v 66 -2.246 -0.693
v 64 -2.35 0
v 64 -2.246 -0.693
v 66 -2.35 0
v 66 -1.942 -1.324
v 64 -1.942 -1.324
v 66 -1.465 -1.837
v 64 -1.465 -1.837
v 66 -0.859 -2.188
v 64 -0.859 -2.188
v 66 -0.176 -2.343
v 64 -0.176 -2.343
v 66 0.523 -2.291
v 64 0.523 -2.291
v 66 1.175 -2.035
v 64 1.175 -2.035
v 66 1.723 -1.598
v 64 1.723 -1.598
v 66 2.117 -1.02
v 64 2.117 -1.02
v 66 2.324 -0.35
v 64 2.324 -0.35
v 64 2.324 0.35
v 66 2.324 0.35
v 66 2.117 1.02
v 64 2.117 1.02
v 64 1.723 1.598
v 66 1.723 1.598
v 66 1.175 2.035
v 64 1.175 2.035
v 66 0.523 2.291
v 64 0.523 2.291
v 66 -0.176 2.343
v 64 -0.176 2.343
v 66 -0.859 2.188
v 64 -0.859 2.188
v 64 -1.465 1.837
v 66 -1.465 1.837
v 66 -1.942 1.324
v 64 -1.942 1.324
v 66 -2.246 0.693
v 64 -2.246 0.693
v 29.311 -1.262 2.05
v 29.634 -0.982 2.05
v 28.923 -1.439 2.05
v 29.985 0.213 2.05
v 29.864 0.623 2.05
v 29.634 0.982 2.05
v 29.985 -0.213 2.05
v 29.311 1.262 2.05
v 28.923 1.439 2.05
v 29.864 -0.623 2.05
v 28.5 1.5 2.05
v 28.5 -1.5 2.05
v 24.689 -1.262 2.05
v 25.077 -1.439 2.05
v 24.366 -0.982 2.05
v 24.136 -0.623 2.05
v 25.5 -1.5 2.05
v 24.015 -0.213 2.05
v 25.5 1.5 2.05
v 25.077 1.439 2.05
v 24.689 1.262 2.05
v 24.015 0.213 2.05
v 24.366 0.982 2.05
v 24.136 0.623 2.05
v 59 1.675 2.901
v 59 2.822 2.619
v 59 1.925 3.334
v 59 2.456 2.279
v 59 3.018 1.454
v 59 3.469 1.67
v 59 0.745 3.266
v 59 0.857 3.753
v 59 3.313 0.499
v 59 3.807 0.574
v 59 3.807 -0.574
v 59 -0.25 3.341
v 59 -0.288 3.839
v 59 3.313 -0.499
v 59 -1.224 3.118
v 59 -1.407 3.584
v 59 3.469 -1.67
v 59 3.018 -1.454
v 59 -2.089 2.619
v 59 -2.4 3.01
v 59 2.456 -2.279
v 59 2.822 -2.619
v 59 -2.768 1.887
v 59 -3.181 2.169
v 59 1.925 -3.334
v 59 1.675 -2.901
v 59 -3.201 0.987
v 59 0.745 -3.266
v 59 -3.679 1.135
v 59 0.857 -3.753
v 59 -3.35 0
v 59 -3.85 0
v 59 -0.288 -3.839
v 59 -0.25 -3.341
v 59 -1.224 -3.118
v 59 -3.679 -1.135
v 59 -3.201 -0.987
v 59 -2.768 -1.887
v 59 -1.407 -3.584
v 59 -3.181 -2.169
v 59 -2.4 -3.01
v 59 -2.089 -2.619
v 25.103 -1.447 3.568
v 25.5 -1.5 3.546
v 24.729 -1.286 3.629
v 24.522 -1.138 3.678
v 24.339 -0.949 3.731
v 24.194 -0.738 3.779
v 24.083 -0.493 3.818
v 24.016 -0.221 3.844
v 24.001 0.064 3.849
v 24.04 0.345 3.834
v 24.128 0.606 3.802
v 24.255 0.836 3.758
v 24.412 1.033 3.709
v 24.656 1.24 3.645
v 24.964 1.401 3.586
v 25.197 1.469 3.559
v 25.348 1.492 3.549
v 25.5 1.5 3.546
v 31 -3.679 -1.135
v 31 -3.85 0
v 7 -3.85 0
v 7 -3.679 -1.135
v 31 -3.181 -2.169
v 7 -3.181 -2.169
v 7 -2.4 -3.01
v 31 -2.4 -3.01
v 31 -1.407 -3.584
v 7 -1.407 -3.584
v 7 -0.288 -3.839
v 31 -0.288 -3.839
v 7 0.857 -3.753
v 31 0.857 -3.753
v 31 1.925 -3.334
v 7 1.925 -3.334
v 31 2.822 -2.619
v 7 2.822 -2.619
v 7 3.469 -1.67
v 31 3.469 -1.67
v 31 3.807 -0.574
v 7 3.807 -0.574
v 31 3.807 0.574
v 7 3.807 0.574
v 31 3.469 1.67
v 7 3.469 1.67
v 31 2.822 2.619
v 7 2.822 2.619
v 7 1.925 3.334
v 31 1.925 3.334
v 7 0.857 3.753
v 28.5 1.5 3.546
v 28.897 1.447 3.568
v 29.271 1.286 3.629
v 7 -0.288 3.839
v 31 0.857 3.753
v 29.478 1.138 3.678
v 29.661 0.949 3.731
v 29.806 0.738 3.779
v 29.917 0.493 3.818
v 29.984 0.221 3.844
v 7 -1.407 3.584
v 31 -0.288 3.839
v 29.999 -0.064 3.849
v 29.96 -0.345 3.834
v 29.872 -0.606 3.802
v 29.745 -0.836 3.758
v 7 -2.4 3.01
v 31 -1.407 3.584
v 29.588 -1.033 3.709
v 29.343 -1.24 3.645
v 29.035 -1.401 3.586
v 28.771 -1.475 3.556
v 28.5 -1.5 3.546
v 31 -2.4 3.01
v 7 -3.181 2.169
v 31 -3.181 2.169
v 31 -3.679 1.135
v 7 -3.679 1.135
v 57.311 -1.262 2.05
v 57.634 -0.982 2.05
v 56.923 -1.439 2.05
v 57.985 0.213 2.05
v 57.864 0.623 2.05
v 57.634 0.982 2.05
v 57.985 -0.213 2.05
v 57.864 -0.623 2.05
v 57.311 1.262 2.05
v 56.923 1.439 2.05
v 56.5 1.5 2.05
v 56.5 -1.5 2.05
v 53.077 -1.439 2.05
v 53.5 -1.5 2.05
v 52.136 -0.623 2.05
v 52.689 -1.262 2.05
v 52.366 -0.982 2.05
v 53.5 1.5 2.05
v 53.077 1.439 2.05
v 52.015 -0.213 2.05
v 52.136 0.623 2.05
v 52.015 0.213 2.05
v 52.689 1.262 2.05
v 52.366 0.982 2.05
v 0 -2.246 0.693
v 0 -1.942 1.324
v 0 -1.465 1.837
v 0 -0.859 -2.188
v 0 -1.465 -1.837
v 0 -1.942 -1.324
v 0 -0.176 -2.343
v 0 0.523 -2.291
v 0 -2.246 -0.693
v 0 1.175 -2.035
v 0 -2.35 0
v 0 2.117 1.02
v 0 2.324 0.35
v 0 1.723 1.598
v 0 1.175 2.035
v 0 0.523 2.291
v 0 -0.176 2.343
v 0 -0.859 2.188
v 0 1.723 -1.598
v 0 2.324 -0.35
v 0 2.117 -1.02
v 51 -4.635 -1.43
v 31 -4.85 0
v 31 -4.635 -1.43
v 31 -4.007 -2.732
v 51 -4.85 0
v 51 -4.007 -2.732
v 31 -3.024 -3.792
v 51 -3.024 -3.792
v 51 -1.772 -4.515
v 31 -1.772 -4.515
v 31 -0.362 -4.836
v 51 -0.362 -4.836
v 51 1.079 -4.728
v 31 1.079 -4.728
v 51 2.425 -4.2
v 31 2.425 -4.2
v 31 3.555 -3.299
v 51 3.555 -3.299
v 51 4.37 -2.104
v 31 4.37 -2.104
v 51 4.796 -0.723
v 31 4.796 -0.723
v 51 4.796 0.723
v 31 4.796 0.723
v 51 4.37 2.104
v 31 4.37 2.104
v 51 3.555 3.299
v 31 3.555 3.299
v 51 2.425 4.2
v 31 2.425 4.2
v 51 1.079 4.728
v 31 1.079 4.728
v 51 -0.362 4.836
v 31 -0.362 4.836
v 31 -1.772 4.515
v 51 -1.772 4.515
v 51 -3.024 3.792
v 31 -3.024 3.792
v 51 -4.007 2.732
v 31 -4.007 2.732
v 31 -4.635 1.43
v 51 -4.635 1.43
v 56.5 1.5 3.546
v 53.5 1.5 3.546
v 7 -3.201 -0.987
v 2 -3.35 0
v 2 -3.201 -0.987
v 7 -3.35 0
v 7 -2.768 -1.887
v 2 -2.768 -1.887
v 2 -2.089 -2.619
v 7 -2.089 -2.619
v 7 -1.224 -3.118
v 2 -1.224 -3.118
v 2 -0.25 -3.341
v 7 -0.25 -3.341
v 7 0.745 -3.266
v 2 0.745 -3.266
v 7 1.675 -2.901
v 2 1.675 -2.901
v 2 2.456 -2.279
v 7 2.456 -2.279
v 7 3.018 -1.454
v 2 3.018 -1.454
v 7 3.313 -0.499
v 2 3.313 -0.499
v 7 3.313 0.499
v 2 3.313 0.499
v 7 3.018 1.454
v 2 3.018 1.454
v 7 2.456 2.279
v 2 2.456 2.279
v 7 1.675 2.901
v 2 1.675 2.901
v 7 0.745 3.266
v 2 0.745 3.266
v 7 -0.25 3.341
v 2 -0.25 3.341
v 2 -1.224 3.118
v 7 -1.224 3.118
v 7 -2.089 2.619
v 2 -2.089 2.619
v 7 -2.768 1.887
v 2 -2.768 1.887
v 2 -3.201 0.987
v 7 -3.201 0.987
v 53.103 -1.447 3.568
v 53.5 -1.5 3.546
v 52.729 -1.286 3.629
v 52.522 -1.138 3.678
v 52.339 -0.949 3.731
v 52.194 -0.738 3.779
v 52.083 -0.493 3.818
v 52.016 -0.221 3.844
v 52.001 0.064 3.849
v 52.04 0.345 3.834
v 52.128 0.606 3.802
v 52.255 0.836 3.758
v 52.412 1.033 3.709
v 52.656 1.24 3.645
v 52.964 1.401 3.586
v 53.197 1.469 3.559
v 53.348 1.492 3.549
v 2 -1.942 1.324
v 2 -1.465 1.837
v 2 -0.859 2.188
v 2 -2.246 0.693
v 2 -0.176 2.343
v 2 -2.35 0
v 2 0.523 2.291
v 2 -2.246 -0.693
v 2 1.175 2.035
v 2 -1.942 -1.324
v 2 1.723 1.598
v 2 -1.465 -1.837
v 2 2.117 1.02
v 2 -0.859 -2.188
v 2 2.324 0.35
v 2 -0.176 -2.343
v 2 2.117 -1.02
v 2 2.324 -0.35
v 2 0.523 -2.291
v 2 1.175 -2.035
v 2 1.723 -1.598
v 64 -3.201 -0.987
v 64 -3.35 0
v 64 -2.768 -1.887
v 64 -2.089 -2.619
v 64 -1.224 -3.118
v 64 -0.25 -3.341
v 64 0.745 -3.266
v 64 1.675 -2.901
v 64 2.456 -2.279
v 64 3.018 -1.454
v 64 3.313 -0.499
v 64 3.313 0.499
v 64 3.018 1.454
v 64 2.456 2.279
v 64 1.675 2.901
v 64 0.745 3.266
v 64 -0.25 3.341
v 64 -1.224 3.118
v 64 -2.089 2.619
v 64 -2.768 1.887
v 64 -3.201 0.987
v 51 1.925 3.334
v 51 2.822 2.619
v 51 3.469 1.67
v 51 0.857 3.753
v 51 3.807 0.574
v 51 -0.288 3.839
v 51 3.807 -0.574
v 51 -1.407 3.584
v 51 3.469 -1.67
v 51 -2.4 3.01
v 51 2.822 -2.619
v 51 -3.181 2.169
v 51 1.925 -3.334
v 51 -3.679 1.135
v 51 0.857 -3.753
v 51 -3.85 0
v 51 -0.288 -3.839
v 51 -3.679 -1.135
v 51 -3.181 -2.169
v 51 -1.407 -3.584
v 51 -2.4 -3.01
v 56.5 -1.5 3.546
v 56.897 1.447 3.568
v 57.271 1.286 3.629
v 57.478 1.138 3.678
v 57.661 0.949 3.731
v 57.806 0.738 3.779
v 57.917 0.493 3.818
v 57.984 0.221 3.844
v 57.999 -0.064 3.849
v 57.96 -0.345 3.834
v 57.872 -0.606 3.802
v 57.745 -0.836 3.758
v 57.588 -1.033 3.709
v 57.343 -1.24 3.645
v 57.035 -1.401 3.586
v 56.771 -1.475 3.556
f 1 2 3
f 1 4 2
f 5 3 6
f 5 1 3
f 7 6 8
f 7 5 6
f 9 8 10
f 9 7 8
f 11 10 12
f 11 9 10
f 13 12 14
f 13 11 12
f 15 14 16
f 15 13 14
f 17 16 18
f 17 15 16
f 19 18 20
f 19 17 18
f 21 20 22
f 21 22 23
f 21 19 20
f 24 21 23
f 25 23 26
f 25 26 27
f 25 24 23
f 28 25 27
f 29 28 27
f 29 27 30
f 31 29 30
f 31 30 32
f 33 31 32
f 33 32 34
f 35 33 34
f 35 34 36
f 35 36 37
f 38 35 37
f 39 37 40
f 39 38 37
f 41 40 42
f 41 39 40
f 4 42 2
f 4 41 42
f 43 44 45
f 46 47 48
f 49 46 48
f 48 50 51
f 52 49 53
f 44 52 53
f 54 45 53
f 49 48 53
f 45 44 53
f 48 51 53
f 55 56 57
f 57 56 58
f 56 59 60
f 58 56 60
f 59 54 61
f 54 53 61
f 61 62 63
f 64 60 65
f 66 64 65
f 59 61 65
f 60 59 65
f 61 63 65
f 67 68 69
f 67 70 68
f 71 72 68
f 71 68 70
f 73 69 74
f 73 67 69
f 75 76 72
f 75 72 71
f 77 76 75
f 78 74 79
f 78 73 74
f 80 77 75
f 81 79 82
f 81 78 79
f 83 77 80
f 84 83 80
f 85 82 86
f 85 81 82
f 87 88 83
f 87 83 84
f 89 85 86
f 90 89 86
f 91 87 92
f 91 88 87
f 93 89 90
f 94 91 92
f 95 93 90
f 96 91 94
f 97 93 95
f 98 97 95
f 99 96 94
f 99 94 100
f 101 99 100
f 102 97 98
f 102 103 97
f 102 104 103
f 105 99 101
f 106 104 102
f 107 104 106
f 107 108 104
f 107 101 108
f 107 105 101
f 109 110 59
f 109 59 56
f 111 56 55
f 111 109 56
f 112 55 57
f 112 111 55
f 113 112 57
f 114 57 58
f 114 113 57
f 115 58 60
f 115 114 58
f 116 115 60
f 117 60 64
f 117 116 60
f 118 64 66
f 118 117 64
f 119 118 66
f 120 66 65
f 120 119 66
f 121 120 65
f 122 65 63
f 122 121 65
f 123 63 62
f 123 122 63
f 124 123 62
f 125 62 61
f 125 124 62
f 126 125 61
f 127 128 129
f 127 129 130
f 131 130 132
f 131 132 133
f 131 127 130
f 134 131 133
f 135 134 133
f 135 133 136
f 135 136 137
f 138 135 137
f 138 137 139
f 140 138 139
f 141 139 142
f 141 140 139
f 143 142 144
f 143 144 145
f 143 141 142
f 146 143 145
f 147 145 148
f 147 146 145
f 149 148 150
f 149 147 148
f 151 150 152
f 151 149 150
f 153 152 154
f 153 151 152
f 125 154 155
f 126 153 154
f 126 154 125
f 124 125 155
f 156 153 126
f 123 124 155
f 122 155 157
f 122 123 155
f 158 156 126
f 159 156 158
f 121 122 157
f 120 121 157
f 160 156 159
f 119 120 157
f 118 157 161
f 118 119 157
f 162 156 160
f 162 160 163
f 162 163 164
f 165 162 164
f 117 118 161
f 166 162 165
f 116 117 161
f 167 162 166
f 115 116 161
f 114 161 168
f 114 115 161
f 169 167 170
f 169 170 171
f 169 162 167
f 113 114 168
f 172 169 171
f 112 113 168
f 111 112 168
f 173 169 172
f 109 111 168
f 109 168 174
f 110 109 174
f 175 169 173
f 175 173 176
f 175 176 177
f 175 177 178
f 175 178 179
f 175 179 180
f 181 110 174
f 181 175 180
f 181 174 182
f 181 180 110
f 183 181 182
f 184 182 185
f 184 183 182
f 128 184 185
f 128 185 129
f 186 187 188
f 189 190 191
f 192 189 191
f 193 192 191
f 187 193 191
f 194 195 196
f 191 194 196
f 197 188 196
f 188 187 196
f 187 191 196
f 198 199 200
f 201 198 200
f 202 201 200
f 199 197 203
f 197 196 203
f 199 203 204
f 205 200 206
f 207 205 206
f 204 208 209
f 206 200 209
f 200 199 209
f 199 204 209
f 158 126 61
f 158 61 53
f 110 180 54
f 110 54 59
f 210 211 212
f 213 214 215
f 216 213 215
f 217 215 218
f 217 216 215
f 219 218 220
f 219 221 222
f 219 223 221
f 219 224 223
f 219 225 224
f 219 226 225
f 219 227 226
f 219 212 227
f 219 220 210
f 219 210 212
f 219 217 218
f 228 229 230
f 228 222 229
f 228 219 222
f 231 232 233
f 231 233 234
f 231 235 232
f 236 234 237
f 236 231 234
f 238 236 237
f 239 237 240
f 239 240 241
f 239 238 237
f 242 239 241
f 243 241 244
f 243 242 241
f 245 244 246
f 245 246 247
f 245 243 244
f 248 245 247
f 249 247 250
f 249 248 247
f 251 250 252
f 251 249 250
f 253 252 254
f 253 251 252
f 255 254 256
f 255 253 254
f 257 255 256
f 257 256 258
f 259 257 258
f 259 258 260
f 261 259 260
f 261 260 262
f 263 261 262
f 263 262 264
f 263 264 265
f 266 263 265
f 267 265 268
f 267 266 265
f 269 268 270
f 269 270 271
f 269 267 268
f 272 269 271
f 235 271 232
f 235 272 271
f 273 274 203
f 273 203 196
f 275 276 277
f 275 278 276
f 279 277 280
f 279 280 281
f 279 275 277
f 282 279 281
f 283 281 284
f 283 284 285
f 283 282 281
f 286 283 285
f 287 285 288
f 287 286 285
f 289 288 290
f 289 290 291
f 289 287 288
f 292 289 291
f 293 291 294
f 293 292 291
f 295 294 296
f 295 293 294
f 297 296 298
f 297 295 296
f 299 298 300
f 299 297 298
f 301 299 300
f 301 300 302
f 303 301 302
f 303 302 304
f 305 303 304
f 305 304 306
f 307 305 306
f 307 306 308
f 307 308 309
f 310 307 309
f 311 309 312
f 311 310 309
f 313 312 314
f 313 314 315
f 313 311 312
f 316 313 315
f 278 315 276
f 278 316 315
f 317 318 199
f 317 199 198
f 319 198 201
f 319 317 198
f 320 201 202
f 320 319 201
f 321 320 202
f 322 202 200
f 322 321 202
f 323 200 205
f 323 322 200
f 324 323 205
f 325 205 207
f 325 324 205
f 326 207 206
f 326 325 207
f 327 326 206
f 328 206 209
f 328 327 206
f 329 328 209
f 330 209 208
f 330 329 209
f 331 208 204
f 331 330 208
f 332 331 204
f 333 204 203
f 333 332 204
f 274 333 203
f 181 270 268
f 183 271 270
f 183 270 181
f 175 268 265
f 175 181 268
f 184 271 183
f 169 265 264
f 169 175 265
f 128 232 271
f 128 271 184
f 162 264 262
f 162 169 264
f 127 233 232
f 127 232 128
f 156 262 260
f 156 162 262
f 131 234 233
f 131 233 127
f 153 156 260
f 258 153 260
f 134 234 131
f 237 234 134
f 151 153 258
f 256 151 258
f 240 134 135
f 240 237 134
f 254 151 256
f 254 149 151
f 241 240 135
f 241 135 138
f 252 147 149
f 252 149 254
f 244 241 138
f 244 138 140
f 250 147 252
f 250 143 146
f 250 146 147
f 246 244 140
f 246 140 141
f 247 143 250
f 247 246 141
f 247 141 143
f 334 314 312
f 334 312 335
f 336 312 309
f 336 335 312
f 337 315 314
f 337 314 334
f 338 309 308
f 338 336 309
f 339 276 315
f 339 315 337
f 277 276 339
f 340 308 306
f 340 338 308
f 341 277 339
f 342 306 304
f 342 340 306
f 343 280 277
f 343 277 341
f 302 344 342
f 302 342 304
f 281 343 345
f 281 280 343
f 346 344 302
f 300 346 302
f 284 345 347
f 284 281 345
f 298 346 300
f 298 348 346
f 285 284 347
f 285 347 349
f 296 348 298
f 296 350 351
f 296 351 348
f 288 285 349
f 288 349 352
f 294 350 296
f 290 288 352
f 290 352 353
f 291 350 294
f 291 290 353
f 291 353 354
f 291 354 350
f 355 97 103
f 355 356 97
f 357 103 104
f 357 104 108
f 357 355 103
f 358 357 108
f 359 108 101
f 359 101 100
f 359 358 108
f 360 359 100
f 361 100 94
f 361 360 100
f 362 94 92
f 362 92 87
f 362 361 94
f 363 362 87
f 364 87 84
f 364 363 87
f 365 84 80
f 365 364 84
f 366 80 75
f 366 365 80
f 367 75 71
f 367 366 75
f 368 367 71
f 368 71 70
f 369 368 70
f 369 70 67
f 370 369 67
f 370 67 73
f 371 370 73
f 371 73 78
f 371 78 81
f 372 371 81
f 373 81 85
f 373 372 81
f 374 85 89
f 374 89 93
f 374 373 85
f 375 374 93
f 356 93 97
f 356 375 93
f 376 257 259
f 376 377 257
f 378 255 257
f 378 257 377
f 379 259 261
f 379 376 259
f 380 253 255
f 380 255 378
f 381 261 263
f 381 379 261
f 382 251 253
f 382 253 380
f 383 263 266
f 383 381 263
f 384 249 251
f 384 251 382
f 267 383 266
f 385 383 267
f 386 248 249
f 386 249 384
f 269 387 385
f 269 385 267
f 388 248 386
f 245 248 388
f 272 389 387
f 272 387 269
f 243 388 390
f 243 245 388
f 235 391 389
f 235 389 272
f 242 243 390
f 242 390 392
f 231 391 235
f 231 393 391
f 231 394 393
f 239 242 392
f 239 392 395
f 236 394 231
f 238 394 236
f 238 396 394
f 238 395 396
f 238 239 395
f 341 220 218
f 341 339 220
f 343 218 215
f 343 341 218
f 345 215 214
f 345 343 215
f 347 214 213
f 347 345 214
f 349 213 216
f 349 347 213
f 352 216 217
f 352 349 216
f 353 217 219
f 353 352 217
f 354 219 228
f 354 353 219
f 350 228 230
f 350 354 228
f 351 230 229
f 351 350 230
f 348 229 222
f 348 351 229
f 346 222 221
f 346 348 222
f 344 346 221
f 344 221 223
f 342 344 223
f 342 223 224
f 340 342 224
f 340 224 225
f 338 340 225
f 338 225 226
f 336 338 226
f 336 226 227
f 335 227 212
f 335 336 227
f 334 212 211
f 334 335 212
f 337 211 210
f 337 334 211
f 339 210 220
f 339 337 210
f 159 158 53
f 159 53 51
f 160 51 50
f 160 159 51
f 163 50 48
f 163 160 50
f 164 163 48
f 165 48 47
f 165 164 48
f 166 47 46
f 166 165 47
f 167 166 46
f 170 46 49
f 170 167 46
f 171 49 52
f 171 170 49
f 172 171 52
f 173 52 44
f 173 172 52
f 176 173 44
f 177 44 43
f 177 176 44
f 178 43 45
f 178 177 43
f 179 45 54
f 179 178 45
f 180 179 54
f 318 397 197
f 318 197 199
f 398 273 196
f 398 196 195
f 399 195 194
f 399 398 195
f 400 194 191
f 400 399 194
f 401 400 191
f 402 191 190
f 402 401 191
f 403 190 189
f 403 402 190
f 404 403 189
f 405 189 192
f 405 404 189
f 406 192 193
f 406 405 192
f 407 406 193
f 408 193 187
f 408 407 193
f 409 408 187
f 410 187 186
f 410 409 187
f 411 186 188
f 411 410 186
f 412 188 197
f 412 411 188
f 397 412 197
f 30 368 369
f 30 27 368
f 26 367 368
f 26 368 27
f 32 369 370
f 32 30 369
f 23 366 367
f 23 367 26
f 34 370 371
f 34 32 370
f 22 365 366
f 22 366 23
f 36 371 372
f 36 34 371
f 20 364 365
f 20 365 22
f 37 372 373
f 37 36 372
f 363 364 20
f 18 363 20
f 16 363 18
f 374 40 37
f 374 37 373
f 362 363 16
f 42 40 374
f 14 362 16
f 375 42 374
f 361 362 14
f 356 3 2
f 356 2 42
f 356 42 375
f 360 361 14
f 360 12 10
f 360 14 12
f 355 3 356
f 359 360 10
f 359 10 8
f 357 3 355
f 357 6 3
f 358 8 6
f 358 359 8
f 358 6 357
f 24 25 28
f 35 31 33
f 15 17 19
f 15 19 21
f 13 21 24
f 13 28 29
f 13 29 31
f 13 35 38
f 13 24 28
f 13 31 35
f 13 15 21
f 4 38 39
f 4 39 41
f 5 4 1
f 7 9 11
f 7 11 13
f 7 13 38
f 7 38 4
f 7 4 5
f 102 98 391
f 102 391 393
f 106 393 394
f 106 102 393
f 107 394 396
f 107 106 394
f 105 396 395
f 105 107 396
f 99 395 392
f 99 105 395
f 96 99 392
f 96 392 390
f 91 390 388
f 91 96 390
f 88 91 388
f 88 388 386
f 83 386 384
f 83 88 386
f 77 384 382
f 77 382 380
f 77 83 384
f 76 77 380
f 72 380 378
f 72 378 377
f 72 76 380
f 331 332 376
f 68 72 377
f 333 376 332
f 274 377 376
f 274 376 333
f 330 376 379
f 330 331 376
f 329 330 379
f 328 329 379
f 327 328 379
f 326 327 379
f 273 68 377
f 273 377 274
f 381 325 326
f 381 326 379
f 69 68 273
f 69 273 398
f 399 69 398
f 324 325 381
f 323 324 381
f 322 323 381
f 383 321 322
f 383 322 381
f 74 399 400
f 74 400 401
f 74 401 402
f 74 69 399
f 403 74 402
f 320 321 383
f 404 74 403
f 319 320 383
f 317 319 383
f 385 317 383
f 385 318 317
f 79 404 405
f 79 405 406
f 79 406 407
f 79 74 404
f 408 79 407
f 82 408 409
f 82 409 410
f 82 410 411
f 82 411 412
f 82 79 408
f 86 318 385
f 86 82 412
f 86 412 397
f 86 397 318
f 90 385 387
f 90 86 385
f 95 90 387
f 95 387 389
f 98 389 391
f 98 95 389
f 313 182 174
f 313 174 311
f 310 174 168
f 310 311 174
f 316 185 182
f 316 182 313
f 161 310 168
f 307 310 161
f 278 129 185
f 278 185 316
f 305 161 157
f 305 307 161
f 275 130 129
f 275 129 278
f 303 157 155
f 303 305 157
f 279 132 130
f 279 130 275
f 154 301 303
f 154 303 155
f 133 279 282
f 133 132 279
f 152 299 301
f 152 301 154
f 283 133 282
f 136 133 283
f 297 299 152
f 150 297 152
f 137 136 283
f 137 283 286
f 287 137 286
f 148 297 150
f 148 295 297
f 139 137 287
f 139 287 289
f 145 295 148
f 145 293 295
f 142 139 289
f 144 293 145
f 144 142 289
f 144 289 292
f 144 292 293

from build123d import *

# Parameters (mm, degrees)
CUT_EXTRUDE_1_DEPTH = 1.8


with BuildPart() as part:
    # 草图1 → 旋转1 (revolve)
    with BuildSketch(Plane.XY, mode=Mode.PRIVATE) as revolve_1_sk:
        Polygon((0, 0), (0, 2.35), (2, 2.35), (2, 3.35), (7, 3.35), (7, 3.85), (31, 3.85), (31, 4.85), (51, 4.85), (51, 3.85), (59, 3.85), (59, 3.35), (64, 3.35), (64, 2.35), (66, 2.35), (66, 0), align=None)
    revolve(revolve_1_sk.sketch.rotate(Axis((0, 0, 0), (1, 0, 0)), 180), axis=Axis((0, 0, 0), (1, 0, 0)))

    # 草图2 → 切除-拉伸1 (cut)
    with BuildSketch(Plane.XY.offset(3.85)):
        with BuildLine():
            Line((25.5, 1.5), (28.5, 1.5))
            ThreePointArc((28.5, 1.5), (30, 0), (28.5, -1.5))
            Line((28.5, -1.5), (25.5, -1.5))
            ThreePointArc((25.5, -1.5), (24, 0), (25.5, 1.5))
        make_face()
        with BuildLine():
            Line((53.5, 1.5), (56.5, 1.5))
            ThreePointArc((56.5, 1.5), (58, 0), (56.5, -1.5))
            Line((56.5, -1.5), (53.5, -1.5))
            ThreePointArc((53.5, -1.5), (52, 0), (53.5, 1.5))
        make_face()
    extrude(amount=-CUT_EXTRUDE_1_DEPTH, mode=Mode.SUBTRACT)


solid = part.part
